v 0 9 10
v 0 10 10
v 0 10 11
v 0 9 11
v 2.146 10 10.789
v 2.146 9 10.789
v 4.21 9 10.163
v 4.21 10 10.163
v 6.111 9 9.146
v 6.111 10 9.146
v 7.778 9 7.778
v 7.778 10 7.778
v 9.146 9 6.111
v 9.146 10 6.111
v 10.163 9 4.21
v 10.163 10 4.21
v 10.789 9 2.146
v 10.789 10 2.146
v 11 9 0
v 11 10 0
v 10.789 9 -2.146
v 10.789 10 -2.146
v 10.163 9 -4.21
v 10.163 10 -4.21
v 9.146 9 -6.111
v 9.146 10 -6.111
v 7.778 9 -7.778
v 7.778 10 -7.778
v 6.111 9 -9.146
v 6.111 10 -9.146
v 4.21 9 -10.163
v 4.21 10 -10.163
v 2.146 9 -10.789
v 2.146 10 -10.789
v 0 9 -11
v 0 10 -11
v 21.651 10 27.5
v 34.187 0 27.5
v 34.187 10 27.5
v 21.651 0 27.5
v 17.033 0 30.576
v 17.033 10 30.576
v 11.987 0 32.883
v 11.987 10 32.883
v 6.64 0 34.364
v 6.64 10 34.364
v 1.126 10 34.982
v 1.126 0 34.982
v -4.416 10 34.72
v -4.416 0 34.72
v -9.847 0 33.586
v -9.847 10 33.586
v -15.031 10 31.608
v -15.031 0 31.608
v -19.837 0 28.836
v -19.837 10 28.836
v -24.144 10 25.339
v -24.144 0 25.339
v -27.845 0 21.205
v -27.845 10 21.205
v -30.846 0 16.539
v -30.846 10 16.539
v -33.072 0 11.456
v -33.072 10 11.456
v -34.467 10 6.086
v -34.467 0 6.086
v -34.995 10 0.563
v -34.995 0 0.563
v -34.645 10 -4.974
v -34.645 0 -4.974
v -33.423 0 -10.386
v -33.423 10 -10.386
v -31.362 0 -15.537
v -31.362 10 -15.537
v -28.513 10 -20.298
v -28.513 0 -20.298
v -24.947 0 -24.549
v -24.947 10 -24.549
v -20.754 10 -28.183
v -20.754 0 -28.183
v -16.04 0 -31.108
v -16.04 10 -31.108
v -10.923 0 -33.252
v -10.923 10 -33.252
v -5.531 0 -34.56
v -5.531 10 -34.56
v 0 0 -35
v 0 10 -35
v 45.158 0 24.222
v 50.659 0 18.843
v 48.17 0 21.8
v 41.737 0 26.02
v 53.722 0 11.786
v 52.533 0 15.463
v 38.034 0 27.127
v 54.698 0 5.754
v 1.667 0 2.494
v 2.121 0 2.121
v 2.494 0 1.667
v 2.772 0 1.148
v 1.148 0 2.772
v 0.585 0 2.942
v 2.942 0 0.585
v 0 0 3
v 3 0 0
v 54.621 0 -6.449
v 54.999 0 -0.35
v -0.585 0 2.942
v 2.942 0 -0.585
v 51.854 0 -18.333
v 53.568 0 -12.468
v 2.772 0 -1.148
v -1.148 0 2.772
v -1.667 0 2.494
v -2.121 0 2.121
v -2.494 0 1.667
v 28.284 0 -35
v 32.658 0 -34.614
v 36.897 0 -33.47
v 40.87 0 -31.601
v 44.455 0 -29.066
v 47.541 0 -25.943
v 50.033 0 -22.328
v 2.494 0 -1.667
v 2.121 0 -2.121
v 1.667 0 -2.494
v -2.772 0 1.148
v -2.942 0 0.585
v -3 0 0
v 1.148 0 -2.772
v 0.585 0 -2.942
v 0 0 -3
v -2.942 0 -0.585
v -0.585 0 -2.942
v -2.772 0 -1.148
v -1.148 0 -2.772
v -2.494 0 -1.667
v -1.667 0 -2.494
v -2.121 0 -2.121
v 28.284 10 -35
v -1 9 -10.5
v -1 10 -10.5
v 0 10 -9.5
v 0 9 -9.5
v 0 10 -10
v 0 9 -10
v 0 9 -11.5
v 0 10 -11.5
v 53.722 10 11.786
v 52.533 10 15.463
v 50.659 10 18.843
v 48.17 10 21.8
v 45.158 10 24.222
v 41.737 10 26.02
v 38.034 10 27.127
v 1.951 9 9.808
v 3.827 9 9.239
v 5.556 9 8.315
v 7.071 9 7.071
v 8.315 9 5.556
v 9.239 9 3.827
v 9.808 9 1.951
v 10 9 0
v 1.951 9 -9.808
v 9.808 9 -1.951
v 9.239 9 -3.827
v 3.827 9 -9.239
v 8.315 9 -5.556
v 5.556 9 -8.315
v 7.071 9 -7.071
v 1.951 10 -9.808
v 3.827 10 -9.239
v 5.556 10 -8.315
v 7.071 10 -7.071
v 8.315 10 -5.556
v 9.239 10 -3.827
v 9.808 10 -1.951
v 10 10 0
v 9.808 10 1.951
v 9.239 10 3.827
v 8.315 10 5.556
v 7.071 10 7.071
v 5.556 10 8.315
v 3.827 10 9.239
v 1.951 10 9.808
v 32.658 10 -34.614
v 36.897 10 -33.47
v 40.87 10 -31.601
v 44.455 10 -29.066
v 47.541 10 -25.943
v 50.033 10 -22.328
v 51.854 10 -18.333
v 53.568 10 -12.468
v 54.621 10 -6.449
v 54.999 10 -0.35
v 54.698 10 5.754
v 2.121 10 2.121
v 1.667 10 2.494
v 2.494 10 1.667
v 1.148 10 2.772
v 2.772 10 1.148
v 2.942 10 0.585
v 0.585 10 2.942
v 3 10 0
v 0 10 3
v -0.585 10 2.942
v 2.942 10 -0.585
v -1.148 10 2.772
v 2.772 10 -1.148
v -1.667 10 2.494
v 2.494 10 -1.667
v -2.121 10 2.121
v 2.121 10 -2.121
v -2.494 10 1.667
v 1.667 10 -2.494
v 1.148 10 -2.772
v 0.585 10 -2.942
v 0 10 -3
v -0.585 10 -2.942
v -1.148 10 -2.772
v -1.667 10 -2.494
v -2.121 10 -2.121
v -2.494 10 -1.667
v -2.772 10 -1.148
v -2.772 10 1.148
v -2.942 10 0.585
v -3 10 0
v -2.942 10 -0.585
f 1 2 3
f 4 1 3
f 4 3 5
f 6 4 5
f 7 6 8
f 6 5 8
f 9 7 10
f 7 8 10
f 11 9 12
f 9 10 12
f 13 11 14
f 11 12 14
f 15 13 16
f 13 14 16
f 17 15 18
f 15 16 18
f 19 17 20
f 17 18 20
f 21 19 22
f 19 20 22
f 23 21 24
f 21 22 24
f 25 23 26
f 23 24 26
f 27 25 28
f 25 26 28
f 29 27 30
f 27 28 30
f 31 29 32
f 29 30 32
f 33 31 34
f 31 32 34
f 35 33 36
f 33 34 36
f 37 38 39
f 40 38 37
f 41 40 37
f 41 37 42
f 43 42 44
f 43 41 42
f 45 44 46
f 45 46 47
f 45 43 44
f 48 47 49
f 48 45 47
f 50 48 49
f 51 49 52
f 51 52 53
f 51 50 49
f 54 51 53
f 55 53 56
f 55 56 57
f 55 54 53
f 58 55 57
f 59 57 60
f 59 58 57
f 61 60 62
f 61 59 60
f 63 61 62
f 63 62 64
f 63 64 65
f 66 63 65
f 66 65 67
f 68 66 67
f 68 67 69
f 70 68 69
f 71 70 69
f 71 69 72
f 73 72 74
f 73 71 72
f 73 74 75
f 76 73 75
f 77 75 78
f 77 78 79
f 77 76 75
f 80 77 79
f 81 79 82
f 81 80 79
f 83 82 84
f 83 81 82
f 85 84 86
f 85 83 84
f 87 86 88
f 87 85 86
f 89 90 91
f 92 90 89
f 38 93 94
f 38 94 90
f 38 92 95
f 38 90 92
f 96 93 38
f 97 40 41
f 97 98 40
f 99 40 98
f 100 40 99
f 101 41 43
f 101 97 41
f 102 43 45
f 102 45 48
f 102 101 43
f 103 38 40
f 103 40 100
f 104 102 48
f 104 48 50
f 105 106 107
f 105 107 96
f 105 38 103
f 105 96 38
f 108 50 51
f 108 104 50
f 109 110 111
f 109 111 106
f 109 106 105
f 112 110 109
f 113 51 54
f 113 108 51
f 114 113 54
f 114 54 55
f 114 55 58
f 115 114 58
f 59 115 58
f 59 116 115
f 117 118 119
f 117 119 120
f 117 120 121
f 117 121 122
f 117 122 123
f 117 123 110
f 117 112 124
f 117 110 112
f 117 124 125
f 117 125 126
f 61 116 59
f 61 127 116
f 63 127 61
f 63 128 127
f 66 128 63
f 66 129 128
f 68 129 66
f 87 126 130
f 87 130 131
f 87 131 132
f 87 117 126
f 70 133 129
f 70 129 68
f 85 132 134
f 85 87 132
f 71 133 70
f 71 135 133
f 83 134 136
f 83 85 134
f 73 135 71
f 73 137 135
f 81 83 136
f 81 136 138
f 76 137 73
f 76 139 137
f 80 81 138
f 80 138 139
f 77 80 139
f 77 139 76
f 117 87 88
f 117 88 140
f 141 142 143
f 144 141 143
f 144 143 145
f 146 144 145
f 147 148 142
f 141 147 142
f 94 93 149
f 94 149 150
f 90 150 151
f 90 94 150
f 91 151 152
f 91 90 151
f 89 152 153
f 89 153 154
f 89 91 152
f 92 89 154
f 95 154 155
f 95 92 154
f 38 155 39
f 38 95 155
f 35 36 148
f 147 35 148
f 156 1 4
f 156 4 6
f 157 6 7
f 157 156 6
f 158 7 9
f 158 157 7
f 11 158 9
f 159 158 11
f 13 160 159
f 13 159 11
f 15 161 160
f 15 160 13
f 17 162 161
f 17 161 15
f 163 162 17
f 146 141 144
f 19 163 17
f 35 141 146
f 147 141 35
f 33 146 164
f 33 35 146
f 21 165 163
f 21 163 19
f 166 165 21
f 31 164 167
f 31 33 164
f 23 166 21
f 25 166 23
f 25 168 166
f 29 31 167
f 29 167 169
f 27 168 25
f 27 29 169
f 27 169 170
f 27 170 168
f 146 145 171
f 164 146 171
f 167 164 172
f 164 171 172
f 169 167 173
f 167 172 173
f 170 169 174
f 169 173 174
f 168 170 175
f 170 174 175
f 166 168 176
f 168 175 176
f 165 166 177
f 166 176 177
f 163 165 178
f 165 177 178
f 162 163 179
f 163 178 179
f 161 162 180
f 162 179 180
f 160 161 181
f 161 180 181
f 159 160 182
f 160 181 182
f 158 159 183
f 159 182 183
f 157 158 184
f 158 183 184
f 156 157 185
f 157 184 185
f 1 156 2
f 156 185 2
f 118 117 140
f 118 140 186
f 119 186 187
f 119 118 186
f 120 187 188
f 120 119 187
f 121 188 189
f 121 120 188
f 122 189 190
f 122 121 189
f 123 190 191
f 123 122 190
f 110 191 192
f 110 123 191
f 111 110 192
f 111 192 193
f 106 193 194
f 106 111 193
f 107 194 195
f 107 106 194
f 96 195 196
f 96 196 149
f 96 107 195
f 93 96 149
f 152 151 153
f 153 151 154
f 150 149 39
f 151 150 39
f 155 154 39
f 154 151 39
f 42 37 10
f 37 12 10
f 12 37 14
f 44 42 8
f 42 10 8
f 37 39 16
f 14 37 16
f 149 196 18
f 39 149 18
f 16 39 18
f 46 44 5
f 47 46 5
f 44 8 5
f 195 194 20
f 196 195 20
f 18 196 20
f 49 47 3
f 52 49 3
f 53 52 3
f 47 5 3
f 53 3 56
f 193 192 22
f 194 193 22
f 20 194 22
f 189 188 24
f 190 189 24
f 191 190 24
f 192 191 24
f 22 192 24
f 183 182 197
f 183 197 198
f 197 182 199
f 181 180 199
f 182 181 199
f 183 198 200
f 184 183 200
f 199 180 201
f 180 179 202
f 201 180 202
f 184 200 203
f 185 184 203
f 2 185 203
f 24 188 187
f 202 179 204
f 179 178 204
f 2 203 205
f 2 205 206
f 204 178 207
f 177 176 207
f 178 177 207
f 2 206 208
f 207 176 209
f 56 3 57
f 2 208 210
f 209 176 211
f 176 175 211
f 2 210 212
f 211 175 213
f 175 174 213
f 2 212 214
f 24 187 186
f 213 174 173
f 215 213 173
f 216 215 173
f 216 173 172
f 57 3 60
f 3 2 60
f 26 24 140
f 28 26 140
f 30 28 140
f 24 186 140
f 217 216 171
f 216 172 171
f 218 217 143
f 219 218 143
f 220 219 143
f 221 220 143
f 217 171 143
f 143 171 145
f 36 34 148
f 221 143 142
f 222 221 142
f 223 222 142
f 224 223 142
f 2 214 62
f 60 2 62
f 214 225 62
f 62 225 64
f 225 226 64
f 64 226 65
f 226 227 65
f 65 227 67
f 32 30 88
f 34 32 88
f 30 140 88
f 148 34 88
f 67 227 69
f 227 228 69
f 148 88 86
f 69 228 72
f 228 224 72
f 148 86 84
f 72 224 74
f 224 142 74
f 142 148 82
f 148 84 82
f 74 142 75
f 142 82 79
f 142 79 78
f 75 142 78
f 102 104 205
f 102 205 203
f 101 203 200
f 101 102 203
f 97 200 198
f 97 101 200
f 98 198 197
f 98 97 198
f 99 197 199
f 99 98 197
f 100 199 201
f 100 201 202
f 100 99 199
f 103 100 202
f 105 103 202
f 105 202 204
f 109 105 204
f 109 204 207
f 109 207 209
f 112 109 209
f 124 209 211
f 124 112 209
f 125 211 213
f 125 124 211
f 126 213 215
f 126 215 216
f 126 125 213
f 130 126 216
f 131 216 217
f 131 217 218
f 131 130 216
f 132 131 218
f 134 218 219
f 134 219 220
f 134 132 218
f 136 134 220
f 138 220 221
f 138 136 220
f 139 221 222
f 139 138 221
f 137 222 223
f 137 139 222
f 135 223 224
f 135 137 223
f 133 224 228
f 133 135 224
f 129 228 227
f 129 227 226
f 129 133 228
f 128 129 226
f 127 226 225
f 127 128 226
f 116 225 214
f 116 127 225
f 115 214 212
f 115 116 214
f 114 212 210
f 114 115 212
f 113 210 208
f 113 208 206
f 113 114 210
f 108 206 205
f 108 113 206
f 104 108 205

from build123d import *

# Parameters (mm, degrees)
SKETCH_1_R          = 3
EXTRUDE_1_DEPTH     = 10
CUT_EXTRUDE_1_DEPTH = 1


with BuildPart() as part:
    # 草圖1 → 填料-伸長1 (new body)
    with BuildSketch(Plane(origin=(0, 0, 0), x_dir=(1, 0, 0), z_dir=(0, 1, 0))):
        with BuildLine():
            Line((0, 35), (28.284271247, 35))
            ThreePointArc((28.284271247, 35), (42.718027977, 30.412414523), (51.854497287, 18.333333333))
            ThreePointArc((51.854497287, 18.333333333), (54.894534338, 3.404423566), (53.722406301, -11.785714286))
            ThreePointArc((53.722406301, -11.785714286), (46.722649239, -23.083874449), (34.186985828, -27.5))
            Line((34.186985828, -27.5), (21.650635095, -27.5))
            ThreePointArc((21.650635095, -27.5), (-33.071891388, -11.456439237), (0, 35))
        make_face()
        with Locations(Location((0, 0, 0), (0, 0, 270))):
            Circle(SKETCH_1_R, mode=Mode.SUBTRACT)
    extrude(amount=EXTRUDE_1_DEPTH)

    # 草圖2 → 除料-伸長1 (cut)
    with BuildSketch(Plane(origin=(0, 10, 0), x_dir=(1, 0, 0), z_dir=(0, 1, 0))):
        with BuildLine():
            Line((0, -10), (0, -11))
            ThreePointArc((0, -11), (11, 0), (0, 11))
            Line((0, 11), (0, 11.5))
            Line((0, 11.5), (-1, 10.5))
            Line((-1, 10.5), (0, 9.5))
            Line((0, 9.5), (0, 10))
            ThreePointArc((0, 10), (10, 0), (0, -10))
        make_face()
    extrude(amount=-CUT_EXTRUDE_1_DEPTH, mode=Mode.SUBTRACT)


solid = part.part
